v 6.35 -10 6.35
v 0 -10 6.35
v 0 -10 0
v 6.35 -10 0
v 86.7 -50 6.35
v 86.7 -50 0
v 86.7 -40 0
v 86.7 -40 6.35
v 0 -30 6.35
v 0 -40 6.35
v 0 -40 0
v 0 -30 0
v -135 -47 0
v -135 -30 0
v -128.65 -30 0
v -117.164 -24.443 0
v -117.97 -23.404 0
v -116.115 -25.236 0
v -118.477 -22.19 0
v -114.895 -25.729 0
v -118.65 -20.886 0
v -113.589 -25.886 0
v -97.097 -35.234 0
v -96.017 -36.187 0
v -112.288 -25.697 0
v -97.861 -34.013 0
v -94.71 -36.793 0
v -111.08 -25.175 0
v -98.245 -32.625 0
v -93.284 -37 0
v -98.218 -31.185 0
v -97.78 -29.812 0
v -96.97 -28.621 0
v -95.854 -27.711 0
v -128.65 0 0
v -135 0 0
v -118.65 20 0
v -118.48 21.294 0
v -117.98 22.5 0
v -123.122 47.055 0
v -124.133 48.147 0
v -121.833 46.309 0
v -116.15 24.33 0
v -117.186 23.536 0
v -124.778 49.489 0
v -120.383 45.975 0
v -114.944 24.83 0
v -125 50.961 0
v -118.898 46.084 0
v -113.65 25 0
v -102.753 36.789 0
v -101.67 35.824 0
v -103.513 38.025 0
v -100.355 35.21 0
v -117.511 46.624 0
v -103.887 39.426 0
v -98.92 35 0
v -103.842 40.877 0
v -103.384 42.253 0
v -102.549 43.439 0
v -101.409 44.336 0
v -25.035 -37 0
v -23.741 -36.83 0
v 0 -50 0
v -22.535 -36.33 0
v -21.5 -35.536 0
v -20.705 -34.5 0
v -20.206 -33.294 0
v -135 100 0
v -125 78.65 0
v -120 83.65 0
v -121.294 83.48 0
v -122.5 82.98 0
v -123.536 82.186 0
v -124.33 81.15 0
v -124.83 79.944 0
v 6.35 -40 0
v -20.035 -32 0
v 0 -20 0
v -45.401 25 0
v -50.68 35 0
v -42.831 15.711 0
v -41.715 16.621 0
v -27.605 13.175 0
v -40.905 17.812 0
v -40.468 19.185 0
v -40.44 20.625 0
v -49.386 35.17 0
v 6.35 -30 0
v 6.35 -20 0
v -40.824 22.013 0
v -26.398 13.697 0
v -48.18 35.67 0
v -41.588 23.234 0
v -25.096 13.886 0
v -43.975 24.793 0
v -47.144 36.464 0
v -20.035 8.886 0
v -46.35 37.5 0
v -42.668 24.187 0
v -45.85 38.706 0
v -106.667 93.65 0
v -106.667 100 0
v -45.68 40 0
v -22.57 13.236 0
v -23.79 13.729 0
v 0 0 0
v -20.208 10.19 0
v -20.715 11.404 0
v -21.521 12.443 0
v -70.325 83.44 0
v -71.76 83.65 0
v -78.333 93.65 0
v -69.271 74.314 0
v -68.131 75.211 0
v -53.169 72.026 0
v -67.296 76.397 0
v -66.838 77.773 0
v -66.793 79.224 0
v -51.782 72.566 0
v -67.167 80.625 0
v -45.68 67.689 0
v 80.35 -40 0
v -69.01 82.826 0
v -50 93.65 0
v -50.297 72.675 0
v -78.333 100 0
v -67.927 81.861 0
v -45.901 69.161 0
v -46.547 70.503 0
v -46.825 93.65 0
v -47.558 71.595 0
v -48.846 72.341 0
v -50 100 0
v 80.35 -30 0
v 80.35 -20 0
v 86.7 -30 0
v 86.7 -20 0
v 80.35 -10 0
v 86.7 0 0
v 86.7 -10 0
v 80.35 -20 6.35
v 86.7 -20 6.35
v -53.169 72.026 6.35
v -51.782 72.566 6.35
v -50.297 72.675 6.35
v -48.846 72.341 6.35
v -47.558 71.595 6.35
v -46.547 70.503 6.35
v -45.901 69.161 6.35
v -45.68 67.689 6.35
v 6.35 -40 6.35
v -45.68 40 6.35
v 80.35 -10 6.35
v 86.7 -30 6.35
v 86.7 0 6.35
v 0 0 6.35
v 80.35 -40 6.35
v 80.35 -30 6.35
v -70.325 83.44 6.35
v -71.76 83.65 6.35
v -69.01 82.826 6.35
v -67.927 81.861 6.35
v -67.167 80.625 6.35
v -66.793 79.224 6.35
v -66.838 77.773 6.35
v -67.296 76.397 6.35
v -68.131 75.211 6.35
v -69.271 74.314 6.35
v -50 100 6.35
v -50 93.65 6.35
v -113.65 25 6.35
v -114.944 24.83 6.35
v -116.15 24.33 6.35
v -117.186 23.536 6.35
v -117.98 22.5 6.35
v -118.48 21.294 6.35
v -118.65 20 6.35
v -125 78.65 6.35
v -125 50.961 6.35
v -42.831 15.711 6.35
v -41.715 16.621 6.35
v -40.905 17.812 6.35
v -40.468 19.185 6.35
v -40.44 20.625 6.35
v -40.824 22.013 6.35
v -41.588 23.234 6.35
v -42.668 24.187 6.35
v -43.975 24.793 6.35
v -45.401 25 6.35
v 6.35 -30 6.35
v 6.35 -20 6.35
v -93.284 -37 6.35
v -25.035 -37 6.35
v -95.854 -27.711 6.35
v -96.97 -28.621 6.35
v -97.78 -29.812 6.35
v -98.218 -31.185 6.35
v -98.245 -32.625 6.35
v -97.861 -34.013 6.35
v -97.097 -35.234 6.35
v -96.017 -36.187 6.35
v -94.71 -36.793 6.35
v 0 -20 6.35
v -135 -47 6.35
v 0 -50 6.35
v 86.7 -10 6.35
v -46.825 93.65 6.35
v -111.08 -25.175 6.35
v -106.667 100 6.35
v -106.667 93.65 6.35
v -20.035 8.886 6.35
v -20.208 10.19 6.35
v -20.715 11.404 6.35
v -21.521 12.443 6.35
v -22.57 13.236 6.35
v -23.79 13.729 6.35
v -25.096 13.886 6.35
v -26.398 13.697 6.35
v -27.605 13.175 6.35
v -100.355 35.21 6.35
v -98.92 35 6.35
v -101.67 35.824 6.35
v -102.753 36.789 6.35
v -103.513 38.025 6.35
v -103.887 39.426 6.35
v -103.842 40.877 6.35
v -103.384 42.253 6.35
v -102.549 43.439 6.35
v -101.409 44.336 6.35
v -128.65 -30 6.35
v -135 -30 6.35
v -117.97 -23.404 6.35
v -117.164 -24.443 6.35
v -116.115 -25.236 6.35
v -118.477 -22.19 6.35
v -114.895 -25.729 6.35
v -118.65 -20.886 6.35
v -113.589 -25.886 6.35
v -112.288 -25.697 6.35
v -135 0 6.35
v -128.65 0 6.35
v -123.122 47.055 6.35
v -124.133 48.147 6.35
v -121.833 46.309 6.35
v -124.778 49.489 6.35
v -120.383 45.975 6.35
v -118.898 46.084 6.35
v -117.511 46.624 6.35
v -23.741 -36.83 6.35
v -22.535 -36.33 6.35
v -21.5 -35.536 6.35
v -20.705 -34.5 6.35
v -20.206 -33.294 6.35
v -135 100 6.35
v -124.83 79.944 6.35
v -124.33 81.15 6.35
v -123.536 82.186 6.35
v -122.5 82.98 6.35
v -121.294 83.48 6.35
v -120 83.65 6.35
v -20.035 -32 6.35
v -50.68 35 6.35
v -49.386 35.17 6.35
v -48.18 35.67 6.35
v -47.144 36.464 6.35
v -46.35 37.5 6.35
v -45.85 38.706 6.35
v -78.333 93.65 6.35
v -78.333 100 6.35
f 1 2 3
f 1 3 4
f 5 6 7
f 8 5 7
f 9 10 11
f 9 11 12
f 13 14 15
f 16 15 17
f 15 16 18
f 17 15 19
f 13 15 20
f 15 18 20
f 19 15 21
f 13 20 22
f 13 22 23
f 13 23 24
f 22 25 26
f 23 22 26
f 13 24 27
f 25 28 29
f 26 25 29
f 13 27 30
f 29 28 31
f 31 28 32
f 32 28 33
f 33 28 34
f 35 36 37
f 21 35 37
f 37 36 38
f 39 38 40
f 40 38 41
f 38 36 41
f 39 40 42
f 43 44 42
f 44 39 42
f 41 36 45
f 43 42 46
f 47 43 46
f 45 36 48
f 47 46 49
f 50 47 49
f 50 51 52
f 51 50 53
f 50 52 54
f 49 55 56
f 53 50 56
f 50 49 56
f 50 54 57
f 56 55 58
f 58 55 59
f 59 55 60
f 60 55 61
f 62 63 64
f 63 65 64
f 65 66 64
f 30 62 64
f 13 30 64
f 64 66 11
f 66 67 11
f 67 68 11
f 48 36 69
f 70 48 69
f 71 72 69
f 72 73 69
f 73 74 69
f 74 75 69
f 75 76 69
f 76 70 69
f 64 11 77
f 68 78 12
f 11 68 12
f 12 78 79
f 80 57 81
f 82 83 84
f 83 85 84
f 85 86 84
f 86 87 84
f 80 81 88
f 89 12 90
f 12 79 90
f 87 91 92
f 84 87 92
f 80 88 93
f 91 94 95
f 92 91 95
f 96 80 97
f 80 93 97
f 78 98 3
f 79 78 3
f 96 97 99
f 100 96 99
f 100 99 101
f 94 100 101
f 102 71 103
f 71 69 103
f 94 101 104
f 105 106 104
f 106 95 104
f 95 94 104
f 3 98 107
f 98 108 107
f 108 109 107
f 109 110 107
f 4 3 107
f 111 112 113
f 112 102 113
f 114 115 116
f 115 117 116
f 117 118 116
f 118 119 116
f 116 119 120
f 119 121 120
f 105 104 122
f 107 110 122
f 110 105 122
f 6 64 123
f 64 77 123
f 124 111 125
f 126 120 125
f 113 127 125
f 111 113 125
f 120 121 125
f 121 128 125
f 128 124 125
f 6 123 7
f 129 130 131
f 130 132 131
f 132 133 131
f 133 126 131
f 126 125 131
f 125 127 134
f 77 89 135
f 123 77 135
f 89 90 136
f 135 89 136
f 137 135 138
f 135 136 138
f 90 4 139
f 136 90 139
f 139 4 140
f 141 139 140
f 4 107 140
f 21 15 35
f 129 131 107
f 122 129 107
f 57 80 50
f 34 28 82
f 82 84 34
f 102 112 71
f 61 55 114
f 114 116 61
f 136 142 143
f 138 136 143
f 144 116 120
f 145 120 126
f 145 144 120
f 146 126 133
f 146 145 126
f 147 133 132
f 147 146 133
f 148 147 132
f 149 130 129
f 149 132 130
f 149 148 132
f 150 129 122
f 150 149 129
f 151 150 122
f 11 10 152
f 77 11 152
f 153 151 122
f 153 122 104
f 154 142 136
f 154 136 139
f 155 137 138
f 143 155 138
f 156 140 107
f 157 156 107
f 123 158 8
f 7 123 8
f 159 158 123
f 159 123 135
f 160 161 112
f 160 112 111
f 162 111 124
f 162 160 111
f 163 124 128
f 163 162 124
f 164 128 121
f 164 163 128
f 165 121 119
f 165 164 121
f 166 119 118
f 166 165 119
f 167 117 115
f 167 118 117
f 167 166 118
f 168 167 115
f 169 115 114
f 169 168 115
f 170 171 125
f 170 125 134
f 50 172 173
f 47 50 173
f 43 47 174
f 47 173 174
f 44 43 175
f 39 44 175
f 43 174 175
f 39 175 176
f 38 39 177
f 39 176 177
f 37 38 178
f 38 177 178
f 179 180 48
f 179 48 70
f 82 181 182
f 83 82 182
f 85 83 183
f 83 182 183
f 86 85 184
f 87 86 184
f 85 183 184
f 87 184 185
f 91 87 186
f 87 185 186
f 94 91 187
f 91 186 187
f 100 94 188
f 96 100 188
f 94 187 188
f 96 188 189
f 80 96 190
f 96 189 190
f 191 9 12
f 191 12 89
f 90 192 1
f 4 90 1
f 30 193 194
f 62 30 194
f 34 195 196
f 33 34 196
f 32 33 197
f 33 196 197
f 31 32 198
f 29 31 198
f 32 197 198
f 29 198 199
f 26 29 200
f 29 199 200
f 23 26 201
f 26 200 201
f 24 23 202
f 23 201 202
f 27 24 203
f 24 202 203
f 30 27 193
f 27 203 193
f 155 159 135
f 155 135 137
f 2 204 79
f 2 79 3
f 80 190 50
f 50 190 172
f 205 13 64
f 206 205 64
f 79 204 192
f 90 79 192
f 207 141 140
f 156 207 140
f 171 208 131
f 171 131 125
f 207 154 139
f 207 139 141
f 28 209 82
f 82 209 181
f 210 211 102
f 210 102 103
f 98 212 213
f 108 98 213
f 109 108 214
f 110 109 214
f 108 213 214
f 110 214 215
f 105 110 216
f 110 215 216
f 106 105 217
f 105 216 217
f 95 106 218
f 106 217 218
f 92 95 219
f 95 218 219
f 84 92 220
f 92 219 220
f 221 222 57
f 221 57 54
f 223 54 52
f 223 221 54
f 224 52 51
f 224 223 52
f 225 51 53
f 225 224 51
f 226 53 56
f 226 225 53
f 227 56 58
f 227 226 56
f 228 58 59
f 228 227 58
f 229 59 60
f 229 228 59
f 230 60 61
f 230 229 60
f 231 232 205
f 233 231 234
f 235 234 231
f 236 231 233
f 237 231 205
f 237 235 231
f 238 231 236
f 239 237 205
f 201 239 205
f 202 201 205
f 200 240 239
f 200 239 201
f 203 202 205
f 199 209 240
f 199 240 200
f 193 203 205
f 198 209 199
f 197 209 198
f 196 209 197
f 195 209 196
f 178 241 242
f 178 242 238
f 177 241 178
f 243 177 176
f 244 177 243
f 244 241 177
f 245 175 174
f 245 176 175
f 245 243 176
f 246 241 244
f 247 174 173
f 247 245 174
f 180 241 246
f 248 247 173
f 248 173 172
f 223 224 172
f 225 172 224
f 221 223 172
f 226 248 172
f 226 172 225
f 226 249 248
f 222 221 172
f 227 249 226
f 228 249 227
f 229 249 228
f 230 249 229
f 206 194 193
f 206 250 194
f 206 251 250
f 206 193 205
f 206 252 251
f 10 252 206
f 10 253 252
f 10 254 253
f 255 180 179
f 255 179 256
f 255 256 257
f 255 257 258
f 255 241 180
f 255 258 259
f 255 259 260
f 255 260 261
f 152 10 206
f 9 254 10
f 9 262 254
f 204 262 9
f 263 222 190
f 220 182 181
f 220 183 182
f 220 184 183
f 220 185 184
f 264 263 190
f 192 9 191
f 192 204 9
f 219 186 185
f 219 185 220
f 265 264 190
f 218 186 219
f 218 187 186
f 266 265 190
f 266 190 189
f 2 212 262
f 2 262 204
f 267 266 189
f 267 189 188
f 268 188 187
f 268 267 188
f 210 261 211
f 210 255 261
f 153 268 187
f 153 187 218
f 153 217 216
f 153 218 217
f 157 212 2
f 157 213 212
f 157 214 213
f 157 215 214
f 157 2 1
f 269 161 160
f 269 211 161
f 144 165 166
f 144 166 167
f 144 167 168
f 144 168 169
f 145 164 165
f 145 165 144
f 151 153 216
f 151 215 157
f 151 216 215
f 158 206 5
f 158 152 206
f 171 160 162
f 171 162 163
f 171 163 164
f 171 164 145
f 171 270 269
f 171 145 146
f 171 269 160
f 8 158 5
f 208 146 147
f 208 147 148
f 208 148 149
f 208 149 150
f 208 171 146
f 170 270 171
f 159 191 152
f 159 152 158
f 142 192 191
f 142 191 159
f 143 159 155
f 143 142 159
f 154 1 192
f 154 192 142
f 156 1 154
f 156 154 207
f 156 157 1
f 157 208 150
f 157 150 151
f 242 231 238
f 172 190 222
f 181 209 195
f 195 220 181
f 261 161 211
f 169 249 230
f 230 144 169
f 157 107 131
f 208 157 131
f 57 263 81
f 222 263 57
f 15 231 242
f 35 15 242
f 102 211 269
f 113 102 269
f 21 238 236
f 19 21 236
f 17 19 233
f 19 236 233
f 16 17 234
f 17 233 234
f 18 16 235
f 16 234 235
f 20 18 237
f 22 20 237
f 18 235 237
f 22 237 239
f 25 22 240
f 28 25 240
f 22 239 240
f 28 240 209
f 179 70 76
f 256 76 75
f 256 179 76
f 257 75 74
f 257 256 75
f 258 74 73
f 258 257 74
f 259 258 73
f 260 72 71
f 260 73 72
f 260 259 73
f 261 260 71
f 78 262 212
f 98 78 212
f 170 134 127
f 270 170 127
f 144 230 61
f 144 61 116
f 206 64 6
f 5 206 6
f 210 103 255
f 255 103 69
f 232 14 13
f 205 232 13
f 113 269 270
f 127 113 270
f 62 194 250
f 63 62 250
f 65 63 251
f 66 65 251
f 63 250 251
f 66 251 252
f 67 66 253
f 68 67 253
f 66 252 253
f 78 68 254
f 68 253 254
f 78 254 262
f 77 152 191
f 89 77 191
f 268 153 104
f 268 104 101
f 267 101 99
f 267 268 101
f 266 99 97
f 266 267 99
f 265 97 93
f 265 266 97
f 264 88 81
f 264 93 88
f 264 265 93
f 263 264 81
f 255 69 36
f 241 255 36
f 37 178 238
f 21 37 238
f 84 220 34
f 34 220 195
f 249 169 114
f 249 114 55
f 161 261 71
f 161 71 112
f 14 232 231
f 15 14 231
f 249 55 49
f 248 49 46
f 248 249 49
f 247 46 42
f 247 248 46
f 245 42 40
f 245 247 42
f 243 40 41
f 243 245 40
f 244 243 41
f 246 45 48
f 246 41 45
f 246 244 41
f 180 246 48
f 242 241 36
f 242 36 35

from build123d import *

# Parameters (mm, degrees)
BODY_DEPTH               = 6.35
CROSS_SUPPORT_REACH      = 170.123
SKETCH2_W                = 6.35
SKETCH2_H                = 30
SIDE_SUPPORTS_REACH      = 170.123
SKETCH3_W                = 6.35
SKETCH3_H                = 10
TOP_MOUNTING_TEETH_REACH = 170.123
SKETCH4_W                = 28.333333334
SKETCH4_H                = 6.35
LIGHTNING_HOLES_REACH    = 170.123


with BuildPart() as part:
    # Sketch1 → Body (new body)
    with BuildSketch(Plane.XY):
        Polygon((86.7, -50), (86.7, 0), (0, 0), (-50, 100), (-135, 100), (-135, -47), (0, -50), align=None)
    extrude(amount=BODY_DEPTH)

    # Sketch2 → Cross support (cut, up to next)
    with BuildSketch(Plane.XY.offset(6.35), mode=Mode.PRIVATE) as cross_support_sk1:
        with Locations((-131.825, -15)):
            Rectangle(SKETCH2_W, SKETCH2_H)
    cross_support_tool1 = extrude(cross_support_sk1.sketch, amount=-CROSS_SUPPORT_REACH, mode=Mode.PRIVATE) & part.part
    add(cross_support_tool1.solids().sort_by_distance((-131.825, -15, 6.35))[0], mode=Mode.SUBTRACT)

    # Sketch3 → Side supports (cut, up to next)
    with BuildSketch(Plane.XY.offset(6.35), mode=Mode.PRIVATE) as side_supports_sk1:
        with Locations((83.525, -15)):
            Rectangle(SKETCH3_W, SKETCH3_H)
    side_supports_tool1 = extrude(side_supports_sk1.sketch, amount=-SIDE_SUPPORTS_REACH, mode=Mode.PRIVATE) & part.part
    # Sketch3 → Side supports (cut, up to next)
    with BuildSketch(Plane.XY.offset(6.35), mode=Mode.PRIVATE) as side_supports_sk2:
        with Locations((83.525, -35)):
            Rectangle(SKETCH3_W, SKETCH3_H)
    side_supports_tool2 = extrude(side_supports_sk2.sketch, amount=-SIDE_SUPPORTS_REACH, mode=Mode.PRIVATE) & part.part
    # Sketch3 → Side supports (cut, up to next)
    with BuildSketch(Plane.XY.offset(6.35), mode=Mode.PRIVATE) as side_supports_sk3:
        with Locations((3.175, -35)):
            Rectangle(SKETCH3_W, SKETCH3_H)
    side_supports_tool3 = extrude(side_supports_sk3.sketch, amount=-SIDE_SUPPORTS_REACH, mode=Mode.PRIVATE) & part.part
    # Sketch3 → Side supports (cut, up to next)
    with BuildSketch(Plane.XY.offset(6.35), mode=Mode.PRIVATE) as side_supports_sk4:
        with Locations((3.175, -15)):
            Rectangle(SKETCH3_W, SKETCH3_H)
    side_supports_tool4 = extrude(side_supports_sk4.sketch, amount=-SIDE_SUPPORTS_REACH, mode=Mode.PRIVATE) & part.part
    add(side_supports_tool1.solids().sort_by_distance((83.525, -15, 6.35))[0], mode=Mode.SUBTRACT)
    add(side_supports_tool2.solids().sort_by_distance((83.525, -35, 6.35))[0], mode=Mode.SUBTRACT)
    add(side_supports_tool3.solids().sort_by_distance((3.175, -35, 6.35))[0], mode=Mode.SUBTRACT)
    add(side_supports_tool4.solids().sort_by_distance((3.175, -15, 6.35))[0], mode=Mode.SUBTRACT)

    # Sketch4 → Top mounting teeth (cut, up to next)
    with BuildSketch(Plane.XY.offset(6.35), mode=Mode.PRIVATE) as top_mounting_teeth_sk1:
        with Locations((-92.5, 96.825)):
            Rectangle(SKETCH4_W, SKETCH4_H)
    top_mounting_teeth_tool1 = extrude(top_mounting_teeth_sk1.sketch, amount=-TOP_MOUNTING_TEETH_REACH, mode=Mode.PRIVATE) & part.part
    # Sketch4 → Top mounting teeth (cut, up to next)
    with BuildSketch(Plane.XY.offset(6.35), mode=Mode.PRIVATE) as top_mounting_teeth_sk2:
        Polygon((-46.825, 93.65), (-50, 93.65), (-50, 100), align=None)
    top_mounting_teeth_tool2 = extrude(top_mounting_teeth_sk2.sketch, amount=-TOP_MOUNTING_TEETH_REACH, mode=Mode.PRIVATE) & part.part
    add(top_mounting_teeth_tool1.solids().sort_by_distance((-92.5, 96.825, 6.35))[0], mode=Mode.SUBTRACT)
    add(top_mounting_teeth_tool2.solids().sort_by_distance((-48.941667, 95.766667, 6.35))[0], mode=Mode.SUBTRACT)

    # Sketch6 → Lightning holes (cut, up to next)
    with BuildSketch(Plane.XY.offset(6.35), mode=Mode.PRIVATE) as lightning_holes_sk1:
        with BuildLine():
            Line((-118.65, 20), (-118.65, -20.886138472))
            ThreePointArc((-118.65, -20.886138472), (-116.114979028, -25.236296905), (-111.080448644, -25.175358194))
            Line((-111.080448644, -25.175358194), (-42.831323725, 15.710780278))
            ThreePointArc((-42.831323725, 15.710780278), (-40.581845168, 21.333023141), (-45.400875081, 25))
            Line((-45.400875081, 25), (-113.65, 25))
            ThreePointArc((-113.65, 25), (-117.185533906, 23.535533906), (-118.65, 20))
        make_face()
    lightning_holes_tool1 = extrude(lightning_holes_sk1.sketch, amount=-LIGHTNING_HOLES_REACH, mode=Mode.PRIVATE) & part.part
    # Sketch6 → Lightning holes (cut, up to next)
    with BuildSketch(Plane.XY.offset(6.35), mode=Mode.PRIVATE) as lightning_holes_sk2:
        with BuildLine():
            Line((-93.284496967, -37), (-25.035372048, -37))
            ThreePointArc((-25.035372048, -37), (-21.499838142, -35.535533906), (-20.035372048, -32))
            Line((-20.035372048, -32), (-20.035372048, 8.886138472))
            ThreePointArc((-20.035372048, 8.886138472), (-22.57039302, 13.236296905), (-27.604923404, 13.175358194))
            Line((-27.604923404, 13.175358194), (-95.854048323, -27.710780278))
            ThreePointArc((-95.854048323, -27.710780278), (-98.10352688, -33.333023141), (-93.284496967, -37))
        make_face()
    lightning_holes_tool2 = extrude(lightning_holes_sk2.sketch, amount=-LIGHTNING_HOLES_REACH, mode=Mode.PRIVATE) & part.part
    # Sketch6 → Lightning holes (cut, up to next)
    with BuildSketch(Plane.XY.offset(6.35), mode=Mode.PRIVATE) as lightning_holes_sk3:
        with BuildLine():
            Line((-125, 50.960581269), (-125, 78.65))
            ThreePointArc((-125, 78.65), (-123.535533906, 82.185533906), (-120, 83.65))
            Line((-120, 83.65), (-71.760111312, 83.65))
            ThreePointArc((-71.760111312, 83.65), (-66.928855022, 79.938007244), (-69.271034073, 74.313585064))
            Line((-69.271034073, 74.313585064), (-117.510922761, 46.624166333))
            ThreePointArc((-117.510922761, 46.624166333), (-122.505455428, 46.633608529), (-125, 50.960581269))
        make_face()
    lightning_holes_tool3 = extrude(lightning_holes_sk3.sketch, amount=-LIGHTNING_HOLES_REACH, mode=Mode.PRIVATE) & part.part
    # Sketch6 → Lightning holes (cut, up to next)
    with BuildSketch(Plane.XY.offset(6.35), mode=Mode.PRIVATE) as lightning_holes_sk4:
        with BuildLine():
            Line((-101.408826755, 44.336414936), (-53.168938067, 72.025833667))
            ThreePointArc((-53.168938067, 72.025833667), (-48.1744054, 72.016391471), (-45.679860828, 67.689418731))
            Line((-45.679860828, 67.689418731), (-45.679860828, 40))
            ThreePointArc((-45.679860828, 40), (-47.144326922, 36.464466094), (-50.679860828, 35))
            Line((-50.679860828, 35), (-98.919749516, 35))
            ThreePointArc((-98.919749516, 35), (-103.751005806, 38.711992756), (-101.408826755, 44.336414936))
        make_face()
    lightning_holes_tool4 = extrude(lightning_holes_sk4.sketch, amount=-LIGHTNING_HOLES_REACH, mode=Mode.PRIVATE) & part.part
    add(lightning_holes_tool1.solids().sort_by_distance((-89.16746, 6.594151, 6.35))[0], mode=Mode.SUBTRACT)
    add(lightning_holes_tool2.solids().sort_by_distance((-49.517912, -18.594151, 6.35))[0], mode=Mode.SUBTRACT)
    add(lightning_holes_tool3.solids().sort_by_distance((-102.306081, 69.637212, 6.35))[0], mode=Mode.SUBTRACT)
    add(lightning_holes_tool4.solids().sort_by_distance((-68.37378, 49.012788, 6.35))[0], mode=Mode.SUBTRACT)


solid = part.part
